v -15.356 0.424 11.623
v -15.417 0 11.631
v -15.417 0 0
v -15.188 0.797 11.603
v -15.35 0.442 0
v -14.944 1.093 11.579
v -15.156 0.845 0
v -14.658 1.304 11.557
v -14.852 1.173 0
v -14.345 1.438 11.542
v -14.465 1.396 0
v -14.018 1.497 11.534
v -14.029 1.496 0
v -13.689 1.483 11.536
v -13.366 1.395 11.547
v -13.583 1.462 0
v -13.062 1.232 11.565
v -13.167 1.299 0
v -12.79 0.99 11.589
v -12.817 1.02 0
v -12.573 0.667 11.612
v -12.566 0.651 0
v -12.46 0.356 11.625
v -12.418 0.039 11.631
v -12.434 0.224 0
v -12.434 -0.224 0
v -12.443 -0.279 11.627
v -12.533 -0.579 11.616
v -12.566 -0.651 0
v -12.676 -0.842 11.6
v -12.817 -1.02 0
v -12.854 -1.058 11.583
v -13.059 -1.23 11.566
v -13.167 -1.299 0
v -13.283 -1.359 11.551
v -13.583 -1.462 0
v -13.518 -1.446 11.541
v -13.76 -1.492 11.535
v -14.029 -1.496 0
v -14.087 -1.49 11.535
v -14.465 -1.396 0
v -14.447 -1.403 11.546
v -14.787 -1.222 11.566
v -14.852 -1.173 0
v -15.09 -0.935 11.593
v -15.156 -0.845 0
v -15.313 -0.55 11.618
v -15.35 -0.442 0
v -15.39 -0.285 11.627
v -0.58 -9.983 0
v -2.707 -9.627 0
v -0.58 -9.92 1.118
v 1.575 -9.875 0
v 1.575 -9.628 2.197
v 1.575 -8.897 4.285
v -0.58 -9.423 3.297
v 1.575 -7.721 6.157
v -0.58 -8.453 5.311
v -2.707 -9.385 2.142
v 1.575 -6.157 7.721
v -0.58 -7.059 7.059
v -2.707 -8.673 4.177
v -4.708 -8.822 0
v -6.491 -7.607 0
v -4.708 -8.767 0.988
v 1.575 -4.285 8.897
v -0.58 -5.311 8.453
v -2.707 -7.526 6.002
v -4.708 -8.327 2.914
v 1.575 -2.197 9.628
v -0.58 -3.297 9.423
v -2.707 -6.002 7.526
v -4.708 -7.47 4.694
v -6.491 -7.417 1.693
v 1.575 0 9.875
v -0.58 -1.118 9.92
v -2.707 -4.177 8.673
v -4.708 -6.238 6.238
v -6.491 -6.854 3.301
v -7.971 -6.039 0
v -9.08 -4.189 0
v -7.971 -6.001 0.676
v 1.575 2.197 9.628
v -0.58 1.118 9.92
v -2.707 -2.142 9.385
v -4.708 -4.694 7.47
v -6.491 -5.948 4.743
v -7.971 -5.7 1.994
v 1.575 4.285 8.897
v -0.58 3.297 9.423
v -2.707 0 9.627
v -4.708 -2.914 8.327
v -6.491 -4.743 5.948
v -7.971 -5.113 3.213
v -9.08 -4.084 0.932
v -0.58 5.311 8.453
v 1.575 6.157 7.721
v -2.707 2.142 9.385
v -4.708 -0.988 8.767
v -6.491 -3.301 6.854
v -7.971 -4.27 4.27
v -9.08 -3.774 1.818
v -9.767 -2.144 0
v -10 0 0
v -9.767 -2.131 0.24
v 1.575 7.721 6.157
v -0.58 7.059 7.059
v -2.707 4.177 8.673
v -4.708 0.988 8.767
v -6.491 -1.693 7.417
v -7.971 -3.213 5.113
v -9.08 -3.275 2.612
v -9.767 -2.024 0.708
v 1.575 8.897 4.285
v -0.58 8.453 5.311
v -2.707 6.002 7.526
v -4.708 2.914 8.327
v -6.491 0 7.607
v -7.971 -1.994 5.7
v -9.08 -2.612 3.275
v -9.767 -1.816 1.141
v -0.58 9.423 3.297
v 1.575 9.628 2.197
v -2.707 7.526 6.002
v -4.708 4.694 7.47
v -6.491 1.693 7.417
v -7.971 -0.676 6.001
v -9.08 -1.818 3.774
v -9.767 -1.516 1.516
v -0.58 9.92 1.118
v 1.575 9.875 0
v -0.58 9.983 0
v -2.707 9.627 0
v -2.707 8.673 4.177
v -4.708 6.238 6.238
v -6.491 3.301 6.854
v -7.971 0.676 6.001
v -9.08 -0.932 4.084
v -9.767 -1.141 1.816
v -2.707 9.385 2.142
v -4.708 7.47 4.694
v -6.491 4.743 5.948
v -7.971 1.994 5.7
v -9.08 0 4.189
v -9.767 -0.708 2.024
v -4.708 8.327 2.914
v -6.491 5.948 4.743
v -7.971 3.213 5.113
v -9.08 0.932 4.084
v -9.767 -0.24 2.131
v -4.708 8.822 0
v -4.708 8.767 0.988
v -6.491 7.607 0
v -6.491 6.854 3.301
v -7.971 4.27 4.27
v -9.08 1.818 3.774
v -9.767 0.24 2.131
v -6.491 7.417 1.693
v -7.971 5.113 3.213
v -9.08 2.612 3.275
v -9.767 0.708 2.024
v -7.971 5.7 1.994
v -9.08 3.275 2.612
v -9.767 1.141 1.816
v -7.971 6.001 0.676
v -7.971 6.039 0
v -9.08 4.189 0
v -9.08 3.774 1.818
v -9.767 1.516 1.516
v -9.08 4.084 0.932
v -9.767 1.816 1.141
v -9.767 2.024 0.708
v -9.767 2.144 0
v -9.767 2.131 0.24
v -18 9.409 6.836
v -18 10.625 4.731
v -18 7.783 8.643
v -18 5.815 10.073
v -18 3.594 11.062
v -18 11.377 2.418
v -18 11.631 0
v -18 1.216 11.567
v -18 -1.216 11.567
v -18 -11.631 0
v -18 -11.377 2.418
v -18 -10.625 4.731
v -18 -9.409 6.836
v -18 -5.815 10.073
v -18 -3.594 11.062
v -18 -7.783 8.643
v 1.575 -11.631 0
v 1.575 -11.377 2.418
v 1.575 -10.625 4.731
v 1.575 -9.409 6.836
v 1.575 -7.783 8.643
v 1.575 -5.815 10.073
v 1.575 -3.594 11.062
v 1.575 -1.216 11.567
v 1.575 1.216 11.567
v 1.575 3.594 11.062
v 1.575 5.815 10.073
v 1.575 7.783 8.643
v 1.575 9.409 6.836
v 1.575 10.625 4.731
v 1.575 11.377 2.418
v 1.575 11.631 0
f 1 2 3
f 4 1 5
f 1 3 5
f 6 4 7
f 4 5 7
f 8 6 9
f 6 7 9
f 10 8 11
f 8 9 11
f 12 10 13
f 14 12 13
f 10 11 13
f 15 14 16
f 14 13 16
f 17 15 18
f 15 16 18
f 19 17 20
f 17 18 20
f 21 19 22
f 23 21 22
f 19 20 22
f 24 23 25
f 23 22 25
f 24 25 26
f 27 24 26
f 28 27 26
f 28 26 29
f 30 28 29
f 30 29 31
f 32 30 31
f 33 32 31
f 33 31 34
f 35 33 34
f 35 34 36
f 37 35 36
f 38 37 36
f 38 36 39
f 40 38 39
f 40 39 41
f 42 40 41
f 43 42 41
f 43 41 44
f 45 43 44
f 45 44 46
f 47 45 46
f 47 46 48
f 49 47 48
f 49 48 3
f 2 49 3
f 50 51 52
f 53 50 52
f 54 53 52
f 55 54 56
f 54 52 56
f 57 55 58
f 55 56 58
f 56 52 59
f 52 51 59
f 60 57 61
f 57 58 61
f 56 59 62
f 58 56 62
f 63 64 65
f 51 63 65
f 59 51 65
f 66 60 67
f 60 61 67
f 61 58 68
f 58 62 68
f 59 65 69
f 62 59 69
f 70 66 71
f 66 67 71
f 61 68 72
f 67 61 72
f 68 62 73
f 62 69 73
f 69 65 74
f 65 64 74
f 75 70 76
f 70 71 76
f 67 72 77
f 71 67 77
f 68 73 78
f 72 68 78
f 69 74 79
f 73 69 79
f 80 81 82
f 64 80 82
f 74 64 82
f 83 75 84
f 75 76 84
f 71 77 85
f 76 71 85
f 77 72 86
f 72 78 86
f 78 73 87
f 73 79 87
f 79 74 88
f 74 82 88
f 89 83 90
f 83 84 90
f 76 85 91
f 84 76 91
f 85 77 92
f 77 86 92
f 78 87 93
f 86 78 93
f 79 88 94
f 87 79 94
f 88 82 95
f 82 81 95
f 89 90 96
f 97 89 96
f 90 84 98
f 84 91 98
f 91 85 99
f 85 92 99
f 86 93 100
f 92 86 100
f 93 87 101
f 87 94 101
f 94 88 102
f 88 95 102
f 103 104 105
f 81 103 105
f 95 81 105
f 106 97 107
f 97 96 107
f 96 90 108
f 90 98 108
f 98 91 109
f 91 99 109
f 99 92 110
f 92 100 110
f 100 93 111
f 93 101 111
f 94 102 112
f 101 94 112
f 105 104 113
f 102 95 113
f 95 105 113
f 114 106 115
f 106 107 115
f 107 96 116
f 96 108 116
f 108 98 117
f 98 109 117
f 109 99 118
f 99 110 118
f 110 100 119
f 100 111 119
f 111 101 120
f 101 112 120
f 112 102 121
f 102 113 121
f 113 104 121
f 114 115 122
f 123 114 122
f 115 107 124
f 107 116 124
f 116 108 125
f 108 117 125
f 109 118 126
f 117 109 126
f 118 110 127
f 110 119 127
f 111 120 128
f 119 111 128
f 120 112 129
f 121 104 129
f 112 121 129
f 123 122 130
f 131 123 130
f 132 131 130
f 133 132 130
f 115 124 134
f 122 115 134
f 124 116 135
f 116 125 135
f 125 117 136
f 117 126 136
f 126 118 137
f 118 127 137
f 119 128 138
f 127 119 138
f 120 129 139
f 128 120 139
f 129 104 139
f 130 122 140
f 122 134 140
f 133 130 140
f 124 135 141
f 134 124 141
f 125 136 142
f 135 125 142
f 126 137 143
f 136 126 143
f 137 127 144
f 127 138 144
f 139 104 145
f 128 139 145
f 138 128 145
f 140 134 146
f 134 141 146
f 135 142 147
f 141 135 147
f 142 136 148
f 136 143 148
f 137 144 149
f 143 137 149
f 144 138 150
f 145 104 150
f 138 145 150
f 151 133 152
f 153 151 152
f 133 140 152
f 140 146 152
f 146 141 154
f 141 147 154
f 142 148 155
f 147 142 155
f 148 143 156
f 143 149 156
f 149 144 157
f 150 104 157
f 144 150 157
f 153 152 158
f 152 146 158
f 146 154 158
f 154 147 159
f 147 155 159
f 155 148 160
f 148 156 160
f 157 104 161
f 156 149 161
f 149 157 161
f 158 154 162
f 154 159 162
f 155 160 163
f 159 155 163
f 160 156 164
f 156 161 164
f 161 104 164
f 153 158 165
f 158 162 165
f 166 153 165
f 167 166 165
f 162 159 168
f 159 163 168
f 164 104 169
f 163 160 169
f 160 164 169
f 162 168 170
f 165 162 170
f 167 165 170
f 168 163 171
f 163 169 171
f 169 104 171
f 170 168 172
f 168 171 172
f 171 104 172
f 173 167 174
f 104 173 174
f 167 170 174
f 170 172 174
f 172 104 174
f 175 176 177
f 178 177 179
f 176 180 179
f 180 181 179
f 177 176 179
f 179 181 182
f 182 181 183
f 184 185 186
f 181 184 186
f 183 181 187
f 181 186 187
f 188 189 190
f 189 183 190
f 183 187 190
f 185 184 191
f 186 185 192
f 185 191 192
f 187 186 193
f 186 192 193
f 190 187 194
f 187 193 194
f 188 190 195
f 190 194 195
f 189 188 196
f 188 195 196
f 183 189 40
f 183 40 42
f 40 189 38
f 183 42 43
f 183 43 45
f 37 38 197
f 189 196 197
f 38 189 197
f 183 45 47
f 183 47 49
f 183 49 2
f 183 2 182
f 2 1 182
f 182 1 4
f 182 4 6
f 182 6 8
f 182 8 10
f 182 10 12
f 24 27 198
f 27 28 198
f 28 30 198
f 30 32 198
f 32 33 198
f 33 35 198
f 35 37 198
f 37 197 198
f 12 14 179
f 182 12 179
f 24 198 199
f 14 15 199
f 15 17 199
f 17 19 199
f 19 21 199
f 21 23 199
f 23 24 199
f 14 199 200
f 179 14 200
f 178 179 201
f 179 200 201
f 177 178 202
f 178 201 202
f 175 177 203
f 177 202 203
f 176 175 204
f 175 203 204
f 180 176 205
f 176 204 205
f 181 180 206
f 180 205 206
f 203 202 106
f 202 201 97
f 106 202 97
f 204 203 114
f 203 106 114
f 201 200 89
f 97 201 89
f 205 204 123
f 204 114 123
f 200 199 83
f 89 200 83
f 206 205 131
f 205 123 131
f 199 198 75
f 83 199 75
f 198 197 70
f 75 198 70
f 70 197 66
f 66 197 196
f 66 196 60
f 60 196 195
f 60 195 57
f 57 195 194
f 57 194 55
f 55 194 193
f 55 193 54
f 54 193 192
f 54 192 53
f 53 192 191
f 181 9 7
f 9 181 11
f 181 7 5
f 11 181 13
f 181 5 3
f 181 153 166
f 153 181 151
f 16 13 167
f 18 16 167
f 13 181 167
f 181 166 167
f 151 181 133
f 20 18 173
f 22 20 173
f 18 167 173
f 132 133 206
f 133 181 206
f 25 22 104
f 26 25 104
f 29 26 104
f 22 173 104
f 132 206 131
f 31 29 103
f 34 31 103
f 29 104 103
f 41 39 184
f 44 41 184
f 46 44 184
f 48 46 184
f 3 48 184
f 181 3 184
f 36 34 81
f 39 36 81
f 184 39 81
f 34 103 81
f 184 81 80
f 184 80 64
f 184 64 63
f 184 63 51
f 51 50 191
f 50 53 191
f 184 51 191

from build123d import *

# Parameters (mm, degrees)
CORTAR_EXTRUIR1_DEPTH = 50
CROQUIS4_R            = 1.5
CORTAR_EXTRUIR2_DEPTH = 20


with BuildPart() as part:
    # Croquis1 → Revolución1 (revolve)
    with BuildSketch(Plane(origin=(0, 0, 0), x_dir=(1, 0, 0), z_dir=(0, 1, 0))):
        with BuildLine():
            Line((-10, 0), (-18, 0))
            Line((-18, 0), (-18, 11.630777084))
            Line((-18, 11.630777084), (1.574675275, 11.630777084))
            Line((1.574675275, 11.630777084), (1.574675275, 9.875241657))
            ThreePointArc((1.574675275, 9.875241657), (-6.490502571, 7.607455315), (-10, 0))
        make_face()
    revolve(axis=Axis((-10, 0, 0), (-1, 0, 0)))

    # Croquis3 → Cortar-Extruir1 (cut)
    with BuildSketch(Plane(origin=(1.574675275, 0, 0), x_dir=(0, 0, -1), z_dir=(1, 0, 0))):
        Polygon((0, 0), (0, -16.586651977), (12.985125339, -16.586651977), (12.985125339, 15.917262398), (0, 15.917262398), align=None)
    extrude(amount=-CORTAR_EXTRUIR1_DEPTH, mode=Mode.SUBTRACT)

    # Croquis4 → Cortar-Extruir2 (cut)
    with BuildSketch(Plane(origin=(0, 0, 0), x_dir=(-1, 0, 0), z_dir=(0, 0, -1))):
        with Locations((13.917030973, 0)):
            Circle(CROQUIS4_R)
    extrude(amount=-CORTAR_EXTRUIR2_DEPTH, mode=Mode.SUBTRACT)


solid = part.part
